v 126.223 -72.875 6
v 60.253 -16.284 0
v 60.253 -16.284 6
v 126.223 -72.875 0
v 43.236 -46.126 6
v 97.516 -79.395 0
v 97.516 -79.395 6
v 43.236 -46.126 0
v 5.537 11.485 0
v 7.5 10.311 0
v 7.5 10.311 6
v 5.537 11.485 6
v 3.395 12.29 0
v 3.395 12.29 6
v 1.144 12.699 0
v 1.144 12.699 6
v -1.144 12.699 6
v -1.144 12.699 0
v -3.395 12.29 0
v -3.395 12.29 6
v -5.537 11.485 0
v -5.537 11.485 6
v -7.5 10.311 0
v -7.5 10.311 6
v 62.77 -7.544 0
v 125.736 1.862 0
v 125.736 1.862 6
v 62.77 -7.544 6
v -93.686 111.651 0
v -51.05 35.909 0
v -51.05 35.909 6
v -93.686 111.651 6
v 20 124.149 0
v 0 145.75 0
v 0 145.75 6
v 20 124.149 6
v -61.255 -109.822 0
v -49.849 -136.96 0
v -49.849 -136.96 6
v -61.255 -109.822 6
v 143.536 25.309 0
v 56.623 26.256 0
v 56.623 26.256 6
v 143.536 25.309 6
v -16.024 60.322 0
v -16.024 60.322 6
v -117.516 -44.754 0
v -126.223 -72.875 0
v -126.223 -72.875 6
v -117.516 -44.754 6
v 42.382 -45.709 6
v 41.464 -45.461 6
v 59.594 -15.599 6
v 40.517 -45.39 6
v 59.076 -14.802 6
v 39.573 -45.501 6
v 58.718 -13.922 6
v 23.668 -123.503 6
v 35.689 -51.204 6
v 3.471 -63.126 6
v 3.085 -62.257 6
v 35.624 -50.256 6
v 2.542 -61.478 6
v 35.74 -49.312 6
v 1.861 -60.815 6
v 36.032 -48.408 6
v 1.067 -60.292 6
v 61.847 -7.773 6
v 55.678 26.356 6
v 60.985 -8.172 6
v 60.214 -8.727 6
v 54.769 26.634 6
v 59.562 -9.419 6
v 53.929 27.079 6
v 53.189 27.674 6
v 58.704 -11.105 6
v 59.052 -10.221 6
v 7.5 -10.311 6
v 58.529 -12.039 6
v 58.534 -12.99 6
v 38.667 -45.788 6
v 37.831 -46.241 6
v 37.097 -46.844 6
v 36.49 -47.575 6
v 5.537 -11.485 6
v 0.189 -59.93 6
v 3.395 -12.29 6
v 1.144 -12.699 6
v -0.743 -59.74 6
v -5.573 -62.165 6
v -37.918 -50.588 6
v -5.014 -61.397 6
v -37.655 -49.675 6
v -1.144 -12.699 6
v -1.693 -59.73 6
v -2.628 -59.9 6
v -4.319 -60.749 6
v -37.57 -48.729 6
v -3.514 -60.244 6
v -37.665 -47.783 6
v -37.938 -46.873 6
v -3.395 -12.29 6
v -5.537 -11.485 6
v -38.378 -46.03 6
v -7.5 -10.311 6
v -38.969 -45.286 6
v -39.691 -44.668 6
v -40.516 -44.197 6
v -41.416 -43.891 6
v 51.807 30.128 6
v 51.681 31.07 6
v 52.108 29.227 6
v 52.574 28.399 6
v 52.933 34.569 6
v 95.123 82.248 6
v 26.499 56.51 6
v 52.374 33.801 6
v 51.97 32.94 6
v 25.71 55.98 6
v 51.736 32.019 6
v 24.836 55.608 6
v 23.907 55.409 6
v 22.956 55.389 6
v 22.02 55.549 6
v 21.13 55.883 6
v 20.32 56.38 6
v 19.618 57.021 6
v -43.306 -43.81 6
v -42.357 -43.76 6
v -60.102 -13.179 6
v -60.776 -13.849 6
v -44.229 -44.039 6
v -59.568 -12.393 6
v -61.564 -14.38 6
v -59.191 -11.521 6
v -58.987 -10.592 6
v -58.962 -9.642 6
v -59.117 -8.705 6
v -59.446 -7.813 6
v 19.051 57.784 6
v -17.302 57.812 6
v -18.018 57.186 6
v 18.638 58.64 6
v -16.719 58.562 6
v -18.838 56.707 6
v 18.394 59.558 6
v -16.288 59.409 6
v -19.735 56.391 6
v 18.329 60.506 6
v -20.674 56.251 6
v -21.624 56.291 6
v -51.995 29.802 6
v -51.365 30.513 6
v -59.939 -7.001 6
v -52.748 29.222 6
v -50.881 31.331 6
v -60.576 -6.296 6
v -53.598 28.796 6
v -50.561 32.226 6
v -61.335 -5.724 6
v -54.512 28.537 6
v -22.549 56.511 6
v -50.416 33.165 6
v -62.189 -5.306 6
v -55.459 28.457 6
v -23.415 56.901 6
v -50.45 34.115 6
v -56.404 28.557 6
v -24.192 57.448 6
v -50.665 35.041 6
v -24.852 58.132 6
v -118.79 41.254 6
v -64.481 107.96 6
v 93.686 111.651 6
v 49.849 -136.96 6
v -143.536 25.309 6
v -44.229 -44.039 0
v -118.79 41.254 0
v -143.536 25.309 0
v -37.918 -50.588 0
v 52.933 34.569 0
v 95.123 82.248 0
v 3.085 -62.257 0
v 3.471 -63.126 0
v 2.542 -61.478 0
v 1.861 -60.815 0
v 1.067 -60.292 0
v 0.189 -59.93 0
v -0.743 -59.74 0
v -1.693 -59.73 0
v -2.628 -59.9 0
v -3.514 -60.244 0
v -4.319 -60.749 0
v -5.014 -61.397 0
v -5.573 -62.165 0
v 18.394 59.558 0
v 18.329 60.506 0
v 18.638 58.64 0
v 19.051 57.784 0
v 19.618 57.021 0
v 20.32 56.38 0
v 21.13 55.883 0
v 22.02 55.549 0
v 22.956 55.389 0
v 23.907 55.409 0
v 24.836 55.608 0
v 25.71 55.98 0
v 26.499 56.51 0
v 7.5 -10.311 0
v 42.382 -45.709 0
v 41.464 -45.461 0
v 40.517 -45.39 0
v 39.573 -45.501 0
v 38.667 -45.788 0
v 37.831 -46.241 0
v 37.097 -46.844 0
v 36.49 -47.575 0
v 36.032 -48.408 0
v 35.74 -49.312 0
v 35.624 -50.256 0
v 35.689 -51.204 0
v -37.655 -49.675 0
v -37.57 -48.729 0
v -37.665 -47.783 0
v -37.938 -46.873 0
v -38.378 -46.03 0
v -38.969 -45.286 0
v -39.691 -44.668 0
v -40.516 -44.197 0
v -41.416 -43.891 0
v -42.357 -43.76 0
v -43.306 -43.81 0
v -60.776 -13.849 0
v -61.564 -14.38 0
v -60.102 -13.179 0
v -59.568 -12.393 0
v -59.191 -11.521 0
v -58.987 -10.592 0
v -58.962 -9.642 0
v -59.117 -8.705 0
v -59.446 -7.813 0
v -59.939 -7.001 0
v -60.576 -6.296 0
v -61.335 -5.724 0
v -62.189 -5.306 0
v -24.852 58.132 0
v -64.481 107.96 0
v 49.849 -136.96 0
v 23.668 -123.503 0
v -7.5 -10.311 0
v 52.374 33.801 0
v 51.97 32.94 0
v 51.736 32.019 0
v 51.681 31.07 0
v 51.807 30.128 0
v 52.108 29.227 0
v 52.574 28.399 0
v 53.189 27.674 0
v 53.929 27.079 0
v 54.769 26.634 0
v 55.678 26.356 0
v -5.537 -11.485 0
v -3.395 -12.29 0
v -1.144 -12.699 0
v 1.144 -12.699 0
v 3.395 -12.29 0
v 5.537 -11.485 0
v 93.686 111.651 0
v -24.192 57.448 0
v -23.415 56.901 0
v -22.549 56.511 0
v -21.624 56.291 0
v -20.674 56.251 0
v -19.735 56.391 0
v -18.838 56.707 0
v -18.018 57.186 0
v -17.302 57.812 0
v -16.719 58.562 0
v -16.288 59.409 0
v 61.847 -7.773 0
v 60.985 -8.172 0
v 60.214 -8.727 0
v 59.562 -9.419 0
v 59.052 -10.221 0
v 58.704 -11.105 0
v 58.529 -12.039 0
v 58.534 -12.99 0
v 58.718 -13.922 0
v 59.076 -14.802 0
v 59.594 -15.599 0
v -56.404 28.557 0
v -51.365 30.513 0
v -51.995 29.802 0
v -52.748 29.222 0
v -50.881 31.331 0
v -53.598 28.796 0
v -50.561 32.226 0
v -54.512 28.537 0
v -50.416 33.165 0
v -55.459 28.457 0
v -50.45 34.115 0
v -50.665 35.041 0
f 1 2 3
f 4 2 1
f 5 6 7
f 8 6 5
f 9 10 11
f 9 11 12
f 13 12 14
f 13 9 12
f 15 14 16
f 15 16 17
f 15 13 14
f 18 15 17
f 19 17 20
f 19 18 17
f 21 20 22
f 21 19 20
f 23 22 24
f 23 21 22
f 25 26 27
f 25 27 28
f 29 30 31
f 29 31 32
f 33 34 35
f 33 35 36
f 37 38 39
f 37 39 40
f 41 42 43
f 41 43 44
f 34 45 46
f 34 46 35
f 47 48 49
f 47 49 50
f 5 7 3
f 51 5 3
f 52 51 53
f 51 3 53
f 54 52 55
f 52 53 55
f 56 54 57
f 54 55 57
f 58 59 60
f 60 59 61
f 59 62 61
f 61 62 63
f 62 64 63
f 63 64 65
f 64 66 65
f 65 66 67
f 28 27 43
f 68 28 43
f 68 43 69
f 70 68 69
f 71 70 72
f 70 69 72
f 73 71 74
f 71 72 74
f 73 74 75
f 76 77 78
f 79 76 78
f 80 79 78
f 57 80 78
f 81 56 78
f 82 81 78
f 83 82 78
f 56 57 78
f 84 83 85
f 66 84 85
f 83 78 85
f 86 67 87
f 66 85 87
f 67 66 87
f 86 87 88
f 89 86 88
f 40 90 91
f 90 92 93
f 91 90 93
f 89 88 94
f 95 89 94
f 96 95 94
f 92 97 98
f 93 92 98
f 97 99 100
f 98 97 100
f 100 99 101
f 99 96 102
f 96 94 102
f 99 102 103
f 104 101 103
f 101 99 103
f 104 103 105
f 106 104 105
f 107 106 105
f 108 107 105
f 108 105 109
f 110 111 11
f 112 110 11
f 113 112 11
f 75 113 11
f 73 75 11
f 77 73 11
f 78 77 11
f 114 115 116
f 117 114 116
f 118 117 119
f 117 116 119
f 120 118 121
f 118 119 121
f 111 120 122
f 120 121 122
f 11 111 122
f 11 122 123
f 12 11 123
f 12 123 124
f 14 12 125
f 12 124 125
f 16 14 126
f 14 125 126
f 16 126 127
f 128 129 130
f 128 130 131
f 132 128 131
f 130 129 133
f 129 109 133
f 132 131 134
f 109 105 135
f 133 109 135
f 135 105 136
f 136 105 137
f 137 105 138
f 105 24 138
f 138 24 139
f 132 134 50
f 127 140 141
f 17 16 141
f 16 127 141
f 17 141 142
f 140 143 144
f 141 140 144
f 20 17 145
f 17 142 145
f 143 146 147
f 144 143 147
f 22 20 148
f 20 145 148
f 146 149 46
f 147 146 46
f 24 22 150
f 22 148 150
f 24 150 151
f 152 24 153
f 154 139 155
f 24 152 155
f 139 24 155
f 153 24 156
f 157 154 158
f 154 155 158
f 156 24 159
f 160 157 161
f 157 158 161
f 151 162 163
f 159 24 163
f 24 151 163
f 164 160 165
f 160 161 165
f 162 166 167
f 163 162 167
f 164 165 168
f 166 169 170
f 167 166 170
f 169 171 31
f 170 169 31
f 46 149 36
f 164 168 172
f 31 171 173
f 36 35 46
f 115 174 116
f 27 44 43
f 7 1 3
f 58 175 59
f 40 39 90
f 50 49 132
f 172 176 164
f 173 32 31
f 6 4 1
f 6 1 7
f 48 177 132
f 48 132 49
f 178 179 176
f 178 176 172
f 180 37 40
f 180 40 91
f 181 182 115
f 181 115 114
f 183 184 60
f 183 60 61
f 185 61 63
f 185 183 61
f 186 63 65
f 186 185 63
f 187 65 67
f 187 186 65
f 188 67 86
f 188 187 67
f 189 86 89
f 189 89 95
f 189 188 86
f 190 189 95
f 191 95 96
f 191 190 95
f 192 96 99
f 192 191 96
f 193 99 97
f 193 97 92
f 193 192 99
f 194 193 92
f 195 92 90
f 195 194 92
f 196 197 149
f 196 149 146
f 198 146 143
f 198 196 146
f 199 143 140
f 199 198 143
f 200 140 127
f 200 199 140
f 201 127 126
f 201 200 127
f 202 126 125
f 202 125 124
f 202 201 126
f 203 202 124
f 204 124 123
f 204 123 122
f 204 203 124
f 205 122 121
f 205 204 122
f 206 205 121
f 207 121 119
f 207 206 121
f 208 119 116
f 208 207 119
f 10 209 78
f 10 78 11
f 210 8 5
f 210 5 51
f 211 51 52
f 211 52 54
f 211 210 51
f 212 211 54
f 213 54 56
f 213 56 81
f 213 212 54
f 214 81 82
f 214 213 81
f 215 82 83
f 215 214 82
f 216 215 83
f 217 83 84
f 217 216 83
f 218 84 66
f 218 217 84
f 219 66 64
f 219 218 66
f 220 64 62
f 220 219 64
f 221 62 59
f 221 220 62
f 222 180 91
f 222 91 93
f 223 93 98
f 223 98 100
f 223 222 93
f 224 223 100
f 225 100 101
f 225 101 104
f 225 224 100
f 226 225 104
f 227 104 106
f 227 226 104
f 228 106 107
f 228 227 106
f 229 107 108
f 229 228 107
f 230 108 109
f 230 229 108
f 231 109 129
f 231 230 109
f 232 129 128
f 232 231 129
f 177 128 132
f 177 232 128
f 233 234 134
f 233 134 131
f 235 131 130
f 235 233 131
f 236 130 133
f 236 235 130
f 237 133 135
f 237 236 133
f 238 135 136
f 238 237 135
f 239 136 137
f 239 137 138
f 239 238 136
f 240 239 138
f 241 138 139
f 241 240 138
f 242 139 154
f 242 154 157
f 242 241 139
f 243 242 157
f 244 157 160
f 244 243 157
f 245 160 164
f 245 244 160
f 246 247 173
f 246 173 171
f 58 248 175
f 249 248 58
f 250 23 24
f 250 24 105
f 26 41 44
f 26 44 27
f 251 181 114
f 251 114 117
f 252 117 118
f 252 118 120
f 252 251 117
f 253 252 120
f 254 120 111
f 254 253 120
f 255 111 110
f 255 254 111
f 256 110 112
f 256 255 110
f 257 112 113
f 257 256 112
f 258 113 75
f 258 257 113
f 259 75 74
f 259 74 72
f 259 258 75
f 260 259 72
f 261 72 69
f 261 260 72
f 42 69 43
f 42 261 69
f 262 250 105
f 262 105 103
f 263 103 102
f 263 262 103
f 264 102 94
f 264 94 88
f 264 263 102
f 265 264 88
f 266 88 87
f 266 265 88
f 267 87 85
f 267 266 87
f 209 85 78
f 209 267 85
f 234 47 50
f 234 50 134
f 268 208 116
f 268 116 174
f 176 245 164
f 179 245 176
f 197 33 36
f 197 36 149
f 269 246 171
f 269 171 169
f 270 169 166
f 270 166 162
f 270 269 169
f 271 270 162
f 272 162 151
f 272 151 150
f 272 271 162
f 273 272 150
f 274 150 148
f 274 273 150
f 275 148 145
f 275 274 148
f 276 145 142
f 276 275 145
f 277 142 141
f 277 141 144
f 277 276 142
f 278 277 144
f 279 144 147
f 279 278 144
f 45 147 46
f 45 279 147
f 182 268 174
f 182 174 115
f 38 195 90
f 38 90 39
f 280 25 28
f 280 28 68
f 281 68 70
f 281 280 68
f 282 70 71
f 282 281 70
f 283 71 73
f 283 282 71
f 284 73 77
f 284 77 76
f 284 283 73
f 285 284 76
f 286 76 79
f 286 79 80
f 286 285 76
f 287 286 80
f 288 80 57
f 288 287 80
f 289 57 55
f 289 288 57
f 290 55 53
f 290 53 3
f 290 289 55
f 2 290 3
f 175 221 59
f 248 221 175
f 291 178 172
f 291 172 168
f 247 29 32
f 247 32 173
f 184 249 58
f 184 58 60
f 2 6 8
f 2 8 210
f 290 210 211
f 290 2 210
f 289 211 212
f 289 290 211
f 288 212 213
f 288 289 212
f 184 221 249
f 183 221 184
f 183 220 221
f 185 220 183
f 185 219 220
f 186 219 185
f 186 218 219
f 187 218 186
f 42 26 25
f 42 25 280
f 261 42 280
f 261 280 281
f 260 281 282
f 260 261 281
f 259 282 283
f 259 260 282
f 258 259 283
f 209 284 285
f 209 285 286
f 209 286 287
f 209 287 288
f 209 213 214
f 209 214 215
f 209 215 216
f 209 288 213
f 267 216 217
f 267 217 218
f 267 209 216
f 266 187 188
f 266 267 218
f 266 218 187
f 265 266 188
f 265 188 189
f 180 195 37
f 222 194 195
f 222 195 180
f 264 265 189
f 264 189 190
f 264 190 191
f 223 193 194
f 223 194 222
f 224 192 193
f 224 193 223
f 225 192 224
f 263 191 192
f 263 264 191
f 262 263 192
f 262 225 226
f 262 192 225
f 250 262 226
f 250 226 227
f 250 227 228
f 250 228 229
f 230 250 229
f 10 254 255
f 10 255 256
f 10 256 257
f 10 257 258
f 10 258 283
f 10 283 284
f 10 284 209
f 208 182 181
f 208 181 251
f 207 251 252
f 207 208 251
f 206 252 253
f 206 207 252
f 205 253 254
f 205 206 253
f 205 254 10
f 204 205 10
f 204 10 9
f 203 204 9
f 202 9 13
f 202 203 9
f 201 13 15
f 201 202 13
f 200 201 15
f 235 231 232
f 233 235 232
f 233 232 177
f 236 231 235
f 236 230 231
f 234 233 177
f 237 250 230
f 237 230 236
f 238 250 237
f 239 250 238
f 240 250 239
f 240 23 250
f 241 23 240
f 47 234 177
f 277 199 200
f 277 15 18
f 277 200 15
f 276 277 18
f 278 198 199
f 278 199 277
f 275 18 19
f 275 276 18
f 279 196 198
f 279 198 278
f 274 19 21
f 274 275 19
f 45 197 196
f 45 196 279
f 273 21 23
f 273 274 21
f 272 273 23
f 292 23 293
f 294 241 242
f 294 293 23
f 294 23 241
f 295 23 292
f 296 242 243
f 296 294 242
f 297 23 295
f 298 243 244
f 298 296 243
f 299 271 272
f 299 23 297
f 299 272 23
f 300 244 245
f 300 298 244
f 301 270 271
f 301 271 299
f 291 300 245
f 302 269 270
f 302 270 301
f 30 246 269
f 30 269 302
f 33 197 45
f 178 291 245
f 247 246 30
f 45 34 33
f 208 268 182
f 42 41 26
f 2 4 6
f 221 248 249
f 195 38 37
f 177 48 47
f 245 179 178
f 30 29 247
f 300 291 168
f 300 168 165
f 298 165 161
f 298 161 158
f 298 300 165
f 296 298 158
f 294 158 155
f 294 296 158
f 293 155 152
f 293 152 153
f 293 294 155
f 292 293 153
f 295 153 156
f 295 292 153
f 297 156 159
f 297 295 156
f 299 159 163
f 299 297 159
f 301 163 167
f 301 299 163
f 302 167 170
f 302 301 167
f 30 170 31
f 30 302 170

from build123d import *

# Parameters (mm, degrees)
BOSS_EXTRU_1_DEPTH = 6


with BuildPart() as part:
    # Esquisse1 → Boss.-Extru.1 (new body)
    with BuildSketch(Plane.XY):
        with BuildLine():
            Line((-16.024411517, 60.322401795), (0, 145.75))
            Line((0, 145.75), (20, 124.149355617))
            Line((20, 124.149355617), (18.328771536, 60.506183401))
            ThreePointArc((18.328771536, 60.506183401), (21.130165565, 55.883417087), (26.499081063, 56.509933866))
            Line((26.499081063, 56.509933866), (93.686294112, 111.650977585))
            Line((93.686294112, 111.650977585), (95.122556403, 82.248171793))
            Line((95.122556403, 82.248171793), (52.933278584, 34.568918325))
            ThreePointArc((52.933278584, 34.568918325), (52.107814004, 29.226972506), (56.62335911, 26.255839844))
            Line((56.62335911, 26.255839844), (143.535730002, 25.309221895))
            Line((143.535730002, 25.309221895), (125.736211496, 1.862154301))
            Line((125.736211496, 1.862154301), (62.769716295, -7.543527827))
            ThreePointArc((62.769716295, -7.543527827), (58.703637157, -11.105097332), (60.25293813, -16.283653443))
            Line((60.25293813, -16.283653443), (126.223202602, -72.875))
            Line((126.223202602, -72.875), (97.516495827, -79.395185884))
            Line((97.516495827, -79.395185884), (43.235506143, -46.126273471))
            ThreePointArc((43.235506143, -46.126273471), (37.831376065, -46.240968709), (35.689497763, -51.203844311))
            Line((35.689497763, -51.203844311), (49.84943589, -136.96019948))
            Line((49.84943589, -136.96019948), (23.667727986, -123.502636215))
            Line((23.667727986, -123.502636215), (3.470922159, -63.126023122))
            ThreePointArc((3.470922159, -63.126023122), (-0.742606336, -59.740176916), (-5.573455253, -62.165187359))
            Line((-5.573455253, -62.165187359), (-49.84943589, -136.96019948))
            Line((-49.84943589, -136.96019948), (-61.255432817, -109.821830482))
            Line((-61.255432817, -109.821830482), (-37.917744879, -50.588404986))
            ThreePointArc((-37.917744879, -50.588404986), (-38.969114979, -45.286292406), (-44.228526613, -44.038748352))
            Line((-44.228526613, -44.038748352), (-126.223202602, -72.875))
            Line((-126.223202602, -72.875), (-117.516495827, -44.754169733))
            Line((-117.516495827, -44.754169733), (-61.564277679, -14.37990993))
            ThreePointArc((-61.564277679, -14.37990993), (-58.961541631, -9.642448378), (-62.188578826, -5.306089555))
            Line((-62.188578826, -5.306089555), (-143.535730002, 25.309221895))
            Line((-143.535730002, 25.309221895), (-118.790284389, 41.254464422))
            Line((-118.790284389, 41.254464422), (-56.404200742, 28.557104797))
            ThreePointArc((-56.404200742, 28.557104797), (-51.365207668, 30.51320441), (-51.049903857, 35.909347515))
            Line((-51.049903857, 35.909347515), (-93.686294112, 111.650977585))
            Line((-93.686294112, 111.650977585), (-64.480778678, 107.959676181))
            Line((-64.480778678, 107.959676181), (-24.851971415, 58.131932813))
            ThreePointArc((-24.851971415, 58.131932813), (-19.734522177, 56.391389738), (-16.024411517, 60.322401795))
        make_face()
        with BuildLine():
            Line((-7.5, 10.310795314), (-7.5, -10.310795314))
            ThreePointArc((-7.5, -10.310795314), (0, -12.75), (7.5, -10.310795314))
            Line((7.5, -10.310795314), (7.5, 10.310795314))
            ThreePointArc((7.5, 10.310795314), (0, 12.75), (-7.5, 10.310795314))
        make_face(mode=Mode.SUBTRACT)
    extrude(amount=BOSS_EXTRU_1_DEPTH)


solid = part.part
